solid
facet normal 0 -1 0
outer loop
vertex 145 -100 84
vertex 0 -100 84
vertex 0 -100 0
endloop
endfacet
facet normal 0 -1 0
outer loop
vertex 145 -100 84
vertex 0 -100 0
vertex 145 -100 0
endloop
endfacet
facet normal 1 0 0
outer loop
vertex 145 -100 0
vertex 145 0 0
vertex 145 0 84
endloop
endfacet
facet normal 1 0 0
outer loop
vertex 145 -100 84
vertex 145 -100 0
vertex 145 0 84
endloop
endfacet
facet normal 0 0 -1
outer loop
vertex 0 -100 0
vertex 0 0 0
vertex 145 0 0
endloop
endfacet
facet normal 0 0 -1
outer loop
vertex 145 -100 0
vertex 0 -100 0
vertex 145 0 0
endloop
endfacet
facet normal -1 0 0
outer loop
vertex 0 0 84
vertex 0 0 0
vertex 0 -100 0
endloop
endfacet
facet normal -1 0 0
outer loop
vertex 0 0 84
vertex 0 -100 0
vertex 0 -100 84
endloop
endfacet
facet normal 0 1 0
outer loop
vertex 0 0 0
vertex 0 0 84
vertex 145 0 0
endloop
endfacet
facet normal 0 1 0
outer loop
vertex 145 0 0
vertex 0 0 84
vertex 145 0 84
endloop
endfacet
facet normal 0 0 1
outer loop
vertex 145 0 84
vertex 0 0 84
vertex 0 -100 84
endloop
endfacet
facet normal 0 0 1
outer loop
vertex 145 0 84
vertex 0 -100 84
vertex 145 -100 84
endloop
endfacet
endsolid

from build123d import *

# Parameters (mm, degrees)
F0_W     = 27.8428420424
F0_H     = 24.9590985477
F1_DEPTH = 145
F2_DEPTH = 145
F3_DEPTH = 84
F4_DEPTH = 45


with BuildPart() as f1:
    # F0 (on Front) → F1 (new body)
    with BuildSketch(Plane.XZ):
        with Locations((13.9214210212, 12.4795492738)):
            Rectangle(F0_W, F0_H)
    extrude(amount=F1_DEPTH)

    # F2 (add): a face of the model
    f2_faces = [f1.faces().sort_by_distance(p)[0] for p in [
        (0, -72.5, 12.4795492738),
    ]]
    extrude(f2_faces, amount=-F2_DEPTH)

    # F3 (add): a face of the model
    f3_faces = [f1.faces().sort_by_distance(p)[0] for p in [
        (72.5, -72.5, 0),
    ]]
    extrude(f3_faces, amount=-F3_DEPTH)

    # F4 (cut): a face of the model
    f4_faces = [f1.faces().sort_by_distance(p)[0] for p in [
        (72.5, -145, 42),
    ]]
    extrude(f4_faces, amount=-F4_DEPTH, mode=Mode.SUBTRACT)


solid = f1.part
